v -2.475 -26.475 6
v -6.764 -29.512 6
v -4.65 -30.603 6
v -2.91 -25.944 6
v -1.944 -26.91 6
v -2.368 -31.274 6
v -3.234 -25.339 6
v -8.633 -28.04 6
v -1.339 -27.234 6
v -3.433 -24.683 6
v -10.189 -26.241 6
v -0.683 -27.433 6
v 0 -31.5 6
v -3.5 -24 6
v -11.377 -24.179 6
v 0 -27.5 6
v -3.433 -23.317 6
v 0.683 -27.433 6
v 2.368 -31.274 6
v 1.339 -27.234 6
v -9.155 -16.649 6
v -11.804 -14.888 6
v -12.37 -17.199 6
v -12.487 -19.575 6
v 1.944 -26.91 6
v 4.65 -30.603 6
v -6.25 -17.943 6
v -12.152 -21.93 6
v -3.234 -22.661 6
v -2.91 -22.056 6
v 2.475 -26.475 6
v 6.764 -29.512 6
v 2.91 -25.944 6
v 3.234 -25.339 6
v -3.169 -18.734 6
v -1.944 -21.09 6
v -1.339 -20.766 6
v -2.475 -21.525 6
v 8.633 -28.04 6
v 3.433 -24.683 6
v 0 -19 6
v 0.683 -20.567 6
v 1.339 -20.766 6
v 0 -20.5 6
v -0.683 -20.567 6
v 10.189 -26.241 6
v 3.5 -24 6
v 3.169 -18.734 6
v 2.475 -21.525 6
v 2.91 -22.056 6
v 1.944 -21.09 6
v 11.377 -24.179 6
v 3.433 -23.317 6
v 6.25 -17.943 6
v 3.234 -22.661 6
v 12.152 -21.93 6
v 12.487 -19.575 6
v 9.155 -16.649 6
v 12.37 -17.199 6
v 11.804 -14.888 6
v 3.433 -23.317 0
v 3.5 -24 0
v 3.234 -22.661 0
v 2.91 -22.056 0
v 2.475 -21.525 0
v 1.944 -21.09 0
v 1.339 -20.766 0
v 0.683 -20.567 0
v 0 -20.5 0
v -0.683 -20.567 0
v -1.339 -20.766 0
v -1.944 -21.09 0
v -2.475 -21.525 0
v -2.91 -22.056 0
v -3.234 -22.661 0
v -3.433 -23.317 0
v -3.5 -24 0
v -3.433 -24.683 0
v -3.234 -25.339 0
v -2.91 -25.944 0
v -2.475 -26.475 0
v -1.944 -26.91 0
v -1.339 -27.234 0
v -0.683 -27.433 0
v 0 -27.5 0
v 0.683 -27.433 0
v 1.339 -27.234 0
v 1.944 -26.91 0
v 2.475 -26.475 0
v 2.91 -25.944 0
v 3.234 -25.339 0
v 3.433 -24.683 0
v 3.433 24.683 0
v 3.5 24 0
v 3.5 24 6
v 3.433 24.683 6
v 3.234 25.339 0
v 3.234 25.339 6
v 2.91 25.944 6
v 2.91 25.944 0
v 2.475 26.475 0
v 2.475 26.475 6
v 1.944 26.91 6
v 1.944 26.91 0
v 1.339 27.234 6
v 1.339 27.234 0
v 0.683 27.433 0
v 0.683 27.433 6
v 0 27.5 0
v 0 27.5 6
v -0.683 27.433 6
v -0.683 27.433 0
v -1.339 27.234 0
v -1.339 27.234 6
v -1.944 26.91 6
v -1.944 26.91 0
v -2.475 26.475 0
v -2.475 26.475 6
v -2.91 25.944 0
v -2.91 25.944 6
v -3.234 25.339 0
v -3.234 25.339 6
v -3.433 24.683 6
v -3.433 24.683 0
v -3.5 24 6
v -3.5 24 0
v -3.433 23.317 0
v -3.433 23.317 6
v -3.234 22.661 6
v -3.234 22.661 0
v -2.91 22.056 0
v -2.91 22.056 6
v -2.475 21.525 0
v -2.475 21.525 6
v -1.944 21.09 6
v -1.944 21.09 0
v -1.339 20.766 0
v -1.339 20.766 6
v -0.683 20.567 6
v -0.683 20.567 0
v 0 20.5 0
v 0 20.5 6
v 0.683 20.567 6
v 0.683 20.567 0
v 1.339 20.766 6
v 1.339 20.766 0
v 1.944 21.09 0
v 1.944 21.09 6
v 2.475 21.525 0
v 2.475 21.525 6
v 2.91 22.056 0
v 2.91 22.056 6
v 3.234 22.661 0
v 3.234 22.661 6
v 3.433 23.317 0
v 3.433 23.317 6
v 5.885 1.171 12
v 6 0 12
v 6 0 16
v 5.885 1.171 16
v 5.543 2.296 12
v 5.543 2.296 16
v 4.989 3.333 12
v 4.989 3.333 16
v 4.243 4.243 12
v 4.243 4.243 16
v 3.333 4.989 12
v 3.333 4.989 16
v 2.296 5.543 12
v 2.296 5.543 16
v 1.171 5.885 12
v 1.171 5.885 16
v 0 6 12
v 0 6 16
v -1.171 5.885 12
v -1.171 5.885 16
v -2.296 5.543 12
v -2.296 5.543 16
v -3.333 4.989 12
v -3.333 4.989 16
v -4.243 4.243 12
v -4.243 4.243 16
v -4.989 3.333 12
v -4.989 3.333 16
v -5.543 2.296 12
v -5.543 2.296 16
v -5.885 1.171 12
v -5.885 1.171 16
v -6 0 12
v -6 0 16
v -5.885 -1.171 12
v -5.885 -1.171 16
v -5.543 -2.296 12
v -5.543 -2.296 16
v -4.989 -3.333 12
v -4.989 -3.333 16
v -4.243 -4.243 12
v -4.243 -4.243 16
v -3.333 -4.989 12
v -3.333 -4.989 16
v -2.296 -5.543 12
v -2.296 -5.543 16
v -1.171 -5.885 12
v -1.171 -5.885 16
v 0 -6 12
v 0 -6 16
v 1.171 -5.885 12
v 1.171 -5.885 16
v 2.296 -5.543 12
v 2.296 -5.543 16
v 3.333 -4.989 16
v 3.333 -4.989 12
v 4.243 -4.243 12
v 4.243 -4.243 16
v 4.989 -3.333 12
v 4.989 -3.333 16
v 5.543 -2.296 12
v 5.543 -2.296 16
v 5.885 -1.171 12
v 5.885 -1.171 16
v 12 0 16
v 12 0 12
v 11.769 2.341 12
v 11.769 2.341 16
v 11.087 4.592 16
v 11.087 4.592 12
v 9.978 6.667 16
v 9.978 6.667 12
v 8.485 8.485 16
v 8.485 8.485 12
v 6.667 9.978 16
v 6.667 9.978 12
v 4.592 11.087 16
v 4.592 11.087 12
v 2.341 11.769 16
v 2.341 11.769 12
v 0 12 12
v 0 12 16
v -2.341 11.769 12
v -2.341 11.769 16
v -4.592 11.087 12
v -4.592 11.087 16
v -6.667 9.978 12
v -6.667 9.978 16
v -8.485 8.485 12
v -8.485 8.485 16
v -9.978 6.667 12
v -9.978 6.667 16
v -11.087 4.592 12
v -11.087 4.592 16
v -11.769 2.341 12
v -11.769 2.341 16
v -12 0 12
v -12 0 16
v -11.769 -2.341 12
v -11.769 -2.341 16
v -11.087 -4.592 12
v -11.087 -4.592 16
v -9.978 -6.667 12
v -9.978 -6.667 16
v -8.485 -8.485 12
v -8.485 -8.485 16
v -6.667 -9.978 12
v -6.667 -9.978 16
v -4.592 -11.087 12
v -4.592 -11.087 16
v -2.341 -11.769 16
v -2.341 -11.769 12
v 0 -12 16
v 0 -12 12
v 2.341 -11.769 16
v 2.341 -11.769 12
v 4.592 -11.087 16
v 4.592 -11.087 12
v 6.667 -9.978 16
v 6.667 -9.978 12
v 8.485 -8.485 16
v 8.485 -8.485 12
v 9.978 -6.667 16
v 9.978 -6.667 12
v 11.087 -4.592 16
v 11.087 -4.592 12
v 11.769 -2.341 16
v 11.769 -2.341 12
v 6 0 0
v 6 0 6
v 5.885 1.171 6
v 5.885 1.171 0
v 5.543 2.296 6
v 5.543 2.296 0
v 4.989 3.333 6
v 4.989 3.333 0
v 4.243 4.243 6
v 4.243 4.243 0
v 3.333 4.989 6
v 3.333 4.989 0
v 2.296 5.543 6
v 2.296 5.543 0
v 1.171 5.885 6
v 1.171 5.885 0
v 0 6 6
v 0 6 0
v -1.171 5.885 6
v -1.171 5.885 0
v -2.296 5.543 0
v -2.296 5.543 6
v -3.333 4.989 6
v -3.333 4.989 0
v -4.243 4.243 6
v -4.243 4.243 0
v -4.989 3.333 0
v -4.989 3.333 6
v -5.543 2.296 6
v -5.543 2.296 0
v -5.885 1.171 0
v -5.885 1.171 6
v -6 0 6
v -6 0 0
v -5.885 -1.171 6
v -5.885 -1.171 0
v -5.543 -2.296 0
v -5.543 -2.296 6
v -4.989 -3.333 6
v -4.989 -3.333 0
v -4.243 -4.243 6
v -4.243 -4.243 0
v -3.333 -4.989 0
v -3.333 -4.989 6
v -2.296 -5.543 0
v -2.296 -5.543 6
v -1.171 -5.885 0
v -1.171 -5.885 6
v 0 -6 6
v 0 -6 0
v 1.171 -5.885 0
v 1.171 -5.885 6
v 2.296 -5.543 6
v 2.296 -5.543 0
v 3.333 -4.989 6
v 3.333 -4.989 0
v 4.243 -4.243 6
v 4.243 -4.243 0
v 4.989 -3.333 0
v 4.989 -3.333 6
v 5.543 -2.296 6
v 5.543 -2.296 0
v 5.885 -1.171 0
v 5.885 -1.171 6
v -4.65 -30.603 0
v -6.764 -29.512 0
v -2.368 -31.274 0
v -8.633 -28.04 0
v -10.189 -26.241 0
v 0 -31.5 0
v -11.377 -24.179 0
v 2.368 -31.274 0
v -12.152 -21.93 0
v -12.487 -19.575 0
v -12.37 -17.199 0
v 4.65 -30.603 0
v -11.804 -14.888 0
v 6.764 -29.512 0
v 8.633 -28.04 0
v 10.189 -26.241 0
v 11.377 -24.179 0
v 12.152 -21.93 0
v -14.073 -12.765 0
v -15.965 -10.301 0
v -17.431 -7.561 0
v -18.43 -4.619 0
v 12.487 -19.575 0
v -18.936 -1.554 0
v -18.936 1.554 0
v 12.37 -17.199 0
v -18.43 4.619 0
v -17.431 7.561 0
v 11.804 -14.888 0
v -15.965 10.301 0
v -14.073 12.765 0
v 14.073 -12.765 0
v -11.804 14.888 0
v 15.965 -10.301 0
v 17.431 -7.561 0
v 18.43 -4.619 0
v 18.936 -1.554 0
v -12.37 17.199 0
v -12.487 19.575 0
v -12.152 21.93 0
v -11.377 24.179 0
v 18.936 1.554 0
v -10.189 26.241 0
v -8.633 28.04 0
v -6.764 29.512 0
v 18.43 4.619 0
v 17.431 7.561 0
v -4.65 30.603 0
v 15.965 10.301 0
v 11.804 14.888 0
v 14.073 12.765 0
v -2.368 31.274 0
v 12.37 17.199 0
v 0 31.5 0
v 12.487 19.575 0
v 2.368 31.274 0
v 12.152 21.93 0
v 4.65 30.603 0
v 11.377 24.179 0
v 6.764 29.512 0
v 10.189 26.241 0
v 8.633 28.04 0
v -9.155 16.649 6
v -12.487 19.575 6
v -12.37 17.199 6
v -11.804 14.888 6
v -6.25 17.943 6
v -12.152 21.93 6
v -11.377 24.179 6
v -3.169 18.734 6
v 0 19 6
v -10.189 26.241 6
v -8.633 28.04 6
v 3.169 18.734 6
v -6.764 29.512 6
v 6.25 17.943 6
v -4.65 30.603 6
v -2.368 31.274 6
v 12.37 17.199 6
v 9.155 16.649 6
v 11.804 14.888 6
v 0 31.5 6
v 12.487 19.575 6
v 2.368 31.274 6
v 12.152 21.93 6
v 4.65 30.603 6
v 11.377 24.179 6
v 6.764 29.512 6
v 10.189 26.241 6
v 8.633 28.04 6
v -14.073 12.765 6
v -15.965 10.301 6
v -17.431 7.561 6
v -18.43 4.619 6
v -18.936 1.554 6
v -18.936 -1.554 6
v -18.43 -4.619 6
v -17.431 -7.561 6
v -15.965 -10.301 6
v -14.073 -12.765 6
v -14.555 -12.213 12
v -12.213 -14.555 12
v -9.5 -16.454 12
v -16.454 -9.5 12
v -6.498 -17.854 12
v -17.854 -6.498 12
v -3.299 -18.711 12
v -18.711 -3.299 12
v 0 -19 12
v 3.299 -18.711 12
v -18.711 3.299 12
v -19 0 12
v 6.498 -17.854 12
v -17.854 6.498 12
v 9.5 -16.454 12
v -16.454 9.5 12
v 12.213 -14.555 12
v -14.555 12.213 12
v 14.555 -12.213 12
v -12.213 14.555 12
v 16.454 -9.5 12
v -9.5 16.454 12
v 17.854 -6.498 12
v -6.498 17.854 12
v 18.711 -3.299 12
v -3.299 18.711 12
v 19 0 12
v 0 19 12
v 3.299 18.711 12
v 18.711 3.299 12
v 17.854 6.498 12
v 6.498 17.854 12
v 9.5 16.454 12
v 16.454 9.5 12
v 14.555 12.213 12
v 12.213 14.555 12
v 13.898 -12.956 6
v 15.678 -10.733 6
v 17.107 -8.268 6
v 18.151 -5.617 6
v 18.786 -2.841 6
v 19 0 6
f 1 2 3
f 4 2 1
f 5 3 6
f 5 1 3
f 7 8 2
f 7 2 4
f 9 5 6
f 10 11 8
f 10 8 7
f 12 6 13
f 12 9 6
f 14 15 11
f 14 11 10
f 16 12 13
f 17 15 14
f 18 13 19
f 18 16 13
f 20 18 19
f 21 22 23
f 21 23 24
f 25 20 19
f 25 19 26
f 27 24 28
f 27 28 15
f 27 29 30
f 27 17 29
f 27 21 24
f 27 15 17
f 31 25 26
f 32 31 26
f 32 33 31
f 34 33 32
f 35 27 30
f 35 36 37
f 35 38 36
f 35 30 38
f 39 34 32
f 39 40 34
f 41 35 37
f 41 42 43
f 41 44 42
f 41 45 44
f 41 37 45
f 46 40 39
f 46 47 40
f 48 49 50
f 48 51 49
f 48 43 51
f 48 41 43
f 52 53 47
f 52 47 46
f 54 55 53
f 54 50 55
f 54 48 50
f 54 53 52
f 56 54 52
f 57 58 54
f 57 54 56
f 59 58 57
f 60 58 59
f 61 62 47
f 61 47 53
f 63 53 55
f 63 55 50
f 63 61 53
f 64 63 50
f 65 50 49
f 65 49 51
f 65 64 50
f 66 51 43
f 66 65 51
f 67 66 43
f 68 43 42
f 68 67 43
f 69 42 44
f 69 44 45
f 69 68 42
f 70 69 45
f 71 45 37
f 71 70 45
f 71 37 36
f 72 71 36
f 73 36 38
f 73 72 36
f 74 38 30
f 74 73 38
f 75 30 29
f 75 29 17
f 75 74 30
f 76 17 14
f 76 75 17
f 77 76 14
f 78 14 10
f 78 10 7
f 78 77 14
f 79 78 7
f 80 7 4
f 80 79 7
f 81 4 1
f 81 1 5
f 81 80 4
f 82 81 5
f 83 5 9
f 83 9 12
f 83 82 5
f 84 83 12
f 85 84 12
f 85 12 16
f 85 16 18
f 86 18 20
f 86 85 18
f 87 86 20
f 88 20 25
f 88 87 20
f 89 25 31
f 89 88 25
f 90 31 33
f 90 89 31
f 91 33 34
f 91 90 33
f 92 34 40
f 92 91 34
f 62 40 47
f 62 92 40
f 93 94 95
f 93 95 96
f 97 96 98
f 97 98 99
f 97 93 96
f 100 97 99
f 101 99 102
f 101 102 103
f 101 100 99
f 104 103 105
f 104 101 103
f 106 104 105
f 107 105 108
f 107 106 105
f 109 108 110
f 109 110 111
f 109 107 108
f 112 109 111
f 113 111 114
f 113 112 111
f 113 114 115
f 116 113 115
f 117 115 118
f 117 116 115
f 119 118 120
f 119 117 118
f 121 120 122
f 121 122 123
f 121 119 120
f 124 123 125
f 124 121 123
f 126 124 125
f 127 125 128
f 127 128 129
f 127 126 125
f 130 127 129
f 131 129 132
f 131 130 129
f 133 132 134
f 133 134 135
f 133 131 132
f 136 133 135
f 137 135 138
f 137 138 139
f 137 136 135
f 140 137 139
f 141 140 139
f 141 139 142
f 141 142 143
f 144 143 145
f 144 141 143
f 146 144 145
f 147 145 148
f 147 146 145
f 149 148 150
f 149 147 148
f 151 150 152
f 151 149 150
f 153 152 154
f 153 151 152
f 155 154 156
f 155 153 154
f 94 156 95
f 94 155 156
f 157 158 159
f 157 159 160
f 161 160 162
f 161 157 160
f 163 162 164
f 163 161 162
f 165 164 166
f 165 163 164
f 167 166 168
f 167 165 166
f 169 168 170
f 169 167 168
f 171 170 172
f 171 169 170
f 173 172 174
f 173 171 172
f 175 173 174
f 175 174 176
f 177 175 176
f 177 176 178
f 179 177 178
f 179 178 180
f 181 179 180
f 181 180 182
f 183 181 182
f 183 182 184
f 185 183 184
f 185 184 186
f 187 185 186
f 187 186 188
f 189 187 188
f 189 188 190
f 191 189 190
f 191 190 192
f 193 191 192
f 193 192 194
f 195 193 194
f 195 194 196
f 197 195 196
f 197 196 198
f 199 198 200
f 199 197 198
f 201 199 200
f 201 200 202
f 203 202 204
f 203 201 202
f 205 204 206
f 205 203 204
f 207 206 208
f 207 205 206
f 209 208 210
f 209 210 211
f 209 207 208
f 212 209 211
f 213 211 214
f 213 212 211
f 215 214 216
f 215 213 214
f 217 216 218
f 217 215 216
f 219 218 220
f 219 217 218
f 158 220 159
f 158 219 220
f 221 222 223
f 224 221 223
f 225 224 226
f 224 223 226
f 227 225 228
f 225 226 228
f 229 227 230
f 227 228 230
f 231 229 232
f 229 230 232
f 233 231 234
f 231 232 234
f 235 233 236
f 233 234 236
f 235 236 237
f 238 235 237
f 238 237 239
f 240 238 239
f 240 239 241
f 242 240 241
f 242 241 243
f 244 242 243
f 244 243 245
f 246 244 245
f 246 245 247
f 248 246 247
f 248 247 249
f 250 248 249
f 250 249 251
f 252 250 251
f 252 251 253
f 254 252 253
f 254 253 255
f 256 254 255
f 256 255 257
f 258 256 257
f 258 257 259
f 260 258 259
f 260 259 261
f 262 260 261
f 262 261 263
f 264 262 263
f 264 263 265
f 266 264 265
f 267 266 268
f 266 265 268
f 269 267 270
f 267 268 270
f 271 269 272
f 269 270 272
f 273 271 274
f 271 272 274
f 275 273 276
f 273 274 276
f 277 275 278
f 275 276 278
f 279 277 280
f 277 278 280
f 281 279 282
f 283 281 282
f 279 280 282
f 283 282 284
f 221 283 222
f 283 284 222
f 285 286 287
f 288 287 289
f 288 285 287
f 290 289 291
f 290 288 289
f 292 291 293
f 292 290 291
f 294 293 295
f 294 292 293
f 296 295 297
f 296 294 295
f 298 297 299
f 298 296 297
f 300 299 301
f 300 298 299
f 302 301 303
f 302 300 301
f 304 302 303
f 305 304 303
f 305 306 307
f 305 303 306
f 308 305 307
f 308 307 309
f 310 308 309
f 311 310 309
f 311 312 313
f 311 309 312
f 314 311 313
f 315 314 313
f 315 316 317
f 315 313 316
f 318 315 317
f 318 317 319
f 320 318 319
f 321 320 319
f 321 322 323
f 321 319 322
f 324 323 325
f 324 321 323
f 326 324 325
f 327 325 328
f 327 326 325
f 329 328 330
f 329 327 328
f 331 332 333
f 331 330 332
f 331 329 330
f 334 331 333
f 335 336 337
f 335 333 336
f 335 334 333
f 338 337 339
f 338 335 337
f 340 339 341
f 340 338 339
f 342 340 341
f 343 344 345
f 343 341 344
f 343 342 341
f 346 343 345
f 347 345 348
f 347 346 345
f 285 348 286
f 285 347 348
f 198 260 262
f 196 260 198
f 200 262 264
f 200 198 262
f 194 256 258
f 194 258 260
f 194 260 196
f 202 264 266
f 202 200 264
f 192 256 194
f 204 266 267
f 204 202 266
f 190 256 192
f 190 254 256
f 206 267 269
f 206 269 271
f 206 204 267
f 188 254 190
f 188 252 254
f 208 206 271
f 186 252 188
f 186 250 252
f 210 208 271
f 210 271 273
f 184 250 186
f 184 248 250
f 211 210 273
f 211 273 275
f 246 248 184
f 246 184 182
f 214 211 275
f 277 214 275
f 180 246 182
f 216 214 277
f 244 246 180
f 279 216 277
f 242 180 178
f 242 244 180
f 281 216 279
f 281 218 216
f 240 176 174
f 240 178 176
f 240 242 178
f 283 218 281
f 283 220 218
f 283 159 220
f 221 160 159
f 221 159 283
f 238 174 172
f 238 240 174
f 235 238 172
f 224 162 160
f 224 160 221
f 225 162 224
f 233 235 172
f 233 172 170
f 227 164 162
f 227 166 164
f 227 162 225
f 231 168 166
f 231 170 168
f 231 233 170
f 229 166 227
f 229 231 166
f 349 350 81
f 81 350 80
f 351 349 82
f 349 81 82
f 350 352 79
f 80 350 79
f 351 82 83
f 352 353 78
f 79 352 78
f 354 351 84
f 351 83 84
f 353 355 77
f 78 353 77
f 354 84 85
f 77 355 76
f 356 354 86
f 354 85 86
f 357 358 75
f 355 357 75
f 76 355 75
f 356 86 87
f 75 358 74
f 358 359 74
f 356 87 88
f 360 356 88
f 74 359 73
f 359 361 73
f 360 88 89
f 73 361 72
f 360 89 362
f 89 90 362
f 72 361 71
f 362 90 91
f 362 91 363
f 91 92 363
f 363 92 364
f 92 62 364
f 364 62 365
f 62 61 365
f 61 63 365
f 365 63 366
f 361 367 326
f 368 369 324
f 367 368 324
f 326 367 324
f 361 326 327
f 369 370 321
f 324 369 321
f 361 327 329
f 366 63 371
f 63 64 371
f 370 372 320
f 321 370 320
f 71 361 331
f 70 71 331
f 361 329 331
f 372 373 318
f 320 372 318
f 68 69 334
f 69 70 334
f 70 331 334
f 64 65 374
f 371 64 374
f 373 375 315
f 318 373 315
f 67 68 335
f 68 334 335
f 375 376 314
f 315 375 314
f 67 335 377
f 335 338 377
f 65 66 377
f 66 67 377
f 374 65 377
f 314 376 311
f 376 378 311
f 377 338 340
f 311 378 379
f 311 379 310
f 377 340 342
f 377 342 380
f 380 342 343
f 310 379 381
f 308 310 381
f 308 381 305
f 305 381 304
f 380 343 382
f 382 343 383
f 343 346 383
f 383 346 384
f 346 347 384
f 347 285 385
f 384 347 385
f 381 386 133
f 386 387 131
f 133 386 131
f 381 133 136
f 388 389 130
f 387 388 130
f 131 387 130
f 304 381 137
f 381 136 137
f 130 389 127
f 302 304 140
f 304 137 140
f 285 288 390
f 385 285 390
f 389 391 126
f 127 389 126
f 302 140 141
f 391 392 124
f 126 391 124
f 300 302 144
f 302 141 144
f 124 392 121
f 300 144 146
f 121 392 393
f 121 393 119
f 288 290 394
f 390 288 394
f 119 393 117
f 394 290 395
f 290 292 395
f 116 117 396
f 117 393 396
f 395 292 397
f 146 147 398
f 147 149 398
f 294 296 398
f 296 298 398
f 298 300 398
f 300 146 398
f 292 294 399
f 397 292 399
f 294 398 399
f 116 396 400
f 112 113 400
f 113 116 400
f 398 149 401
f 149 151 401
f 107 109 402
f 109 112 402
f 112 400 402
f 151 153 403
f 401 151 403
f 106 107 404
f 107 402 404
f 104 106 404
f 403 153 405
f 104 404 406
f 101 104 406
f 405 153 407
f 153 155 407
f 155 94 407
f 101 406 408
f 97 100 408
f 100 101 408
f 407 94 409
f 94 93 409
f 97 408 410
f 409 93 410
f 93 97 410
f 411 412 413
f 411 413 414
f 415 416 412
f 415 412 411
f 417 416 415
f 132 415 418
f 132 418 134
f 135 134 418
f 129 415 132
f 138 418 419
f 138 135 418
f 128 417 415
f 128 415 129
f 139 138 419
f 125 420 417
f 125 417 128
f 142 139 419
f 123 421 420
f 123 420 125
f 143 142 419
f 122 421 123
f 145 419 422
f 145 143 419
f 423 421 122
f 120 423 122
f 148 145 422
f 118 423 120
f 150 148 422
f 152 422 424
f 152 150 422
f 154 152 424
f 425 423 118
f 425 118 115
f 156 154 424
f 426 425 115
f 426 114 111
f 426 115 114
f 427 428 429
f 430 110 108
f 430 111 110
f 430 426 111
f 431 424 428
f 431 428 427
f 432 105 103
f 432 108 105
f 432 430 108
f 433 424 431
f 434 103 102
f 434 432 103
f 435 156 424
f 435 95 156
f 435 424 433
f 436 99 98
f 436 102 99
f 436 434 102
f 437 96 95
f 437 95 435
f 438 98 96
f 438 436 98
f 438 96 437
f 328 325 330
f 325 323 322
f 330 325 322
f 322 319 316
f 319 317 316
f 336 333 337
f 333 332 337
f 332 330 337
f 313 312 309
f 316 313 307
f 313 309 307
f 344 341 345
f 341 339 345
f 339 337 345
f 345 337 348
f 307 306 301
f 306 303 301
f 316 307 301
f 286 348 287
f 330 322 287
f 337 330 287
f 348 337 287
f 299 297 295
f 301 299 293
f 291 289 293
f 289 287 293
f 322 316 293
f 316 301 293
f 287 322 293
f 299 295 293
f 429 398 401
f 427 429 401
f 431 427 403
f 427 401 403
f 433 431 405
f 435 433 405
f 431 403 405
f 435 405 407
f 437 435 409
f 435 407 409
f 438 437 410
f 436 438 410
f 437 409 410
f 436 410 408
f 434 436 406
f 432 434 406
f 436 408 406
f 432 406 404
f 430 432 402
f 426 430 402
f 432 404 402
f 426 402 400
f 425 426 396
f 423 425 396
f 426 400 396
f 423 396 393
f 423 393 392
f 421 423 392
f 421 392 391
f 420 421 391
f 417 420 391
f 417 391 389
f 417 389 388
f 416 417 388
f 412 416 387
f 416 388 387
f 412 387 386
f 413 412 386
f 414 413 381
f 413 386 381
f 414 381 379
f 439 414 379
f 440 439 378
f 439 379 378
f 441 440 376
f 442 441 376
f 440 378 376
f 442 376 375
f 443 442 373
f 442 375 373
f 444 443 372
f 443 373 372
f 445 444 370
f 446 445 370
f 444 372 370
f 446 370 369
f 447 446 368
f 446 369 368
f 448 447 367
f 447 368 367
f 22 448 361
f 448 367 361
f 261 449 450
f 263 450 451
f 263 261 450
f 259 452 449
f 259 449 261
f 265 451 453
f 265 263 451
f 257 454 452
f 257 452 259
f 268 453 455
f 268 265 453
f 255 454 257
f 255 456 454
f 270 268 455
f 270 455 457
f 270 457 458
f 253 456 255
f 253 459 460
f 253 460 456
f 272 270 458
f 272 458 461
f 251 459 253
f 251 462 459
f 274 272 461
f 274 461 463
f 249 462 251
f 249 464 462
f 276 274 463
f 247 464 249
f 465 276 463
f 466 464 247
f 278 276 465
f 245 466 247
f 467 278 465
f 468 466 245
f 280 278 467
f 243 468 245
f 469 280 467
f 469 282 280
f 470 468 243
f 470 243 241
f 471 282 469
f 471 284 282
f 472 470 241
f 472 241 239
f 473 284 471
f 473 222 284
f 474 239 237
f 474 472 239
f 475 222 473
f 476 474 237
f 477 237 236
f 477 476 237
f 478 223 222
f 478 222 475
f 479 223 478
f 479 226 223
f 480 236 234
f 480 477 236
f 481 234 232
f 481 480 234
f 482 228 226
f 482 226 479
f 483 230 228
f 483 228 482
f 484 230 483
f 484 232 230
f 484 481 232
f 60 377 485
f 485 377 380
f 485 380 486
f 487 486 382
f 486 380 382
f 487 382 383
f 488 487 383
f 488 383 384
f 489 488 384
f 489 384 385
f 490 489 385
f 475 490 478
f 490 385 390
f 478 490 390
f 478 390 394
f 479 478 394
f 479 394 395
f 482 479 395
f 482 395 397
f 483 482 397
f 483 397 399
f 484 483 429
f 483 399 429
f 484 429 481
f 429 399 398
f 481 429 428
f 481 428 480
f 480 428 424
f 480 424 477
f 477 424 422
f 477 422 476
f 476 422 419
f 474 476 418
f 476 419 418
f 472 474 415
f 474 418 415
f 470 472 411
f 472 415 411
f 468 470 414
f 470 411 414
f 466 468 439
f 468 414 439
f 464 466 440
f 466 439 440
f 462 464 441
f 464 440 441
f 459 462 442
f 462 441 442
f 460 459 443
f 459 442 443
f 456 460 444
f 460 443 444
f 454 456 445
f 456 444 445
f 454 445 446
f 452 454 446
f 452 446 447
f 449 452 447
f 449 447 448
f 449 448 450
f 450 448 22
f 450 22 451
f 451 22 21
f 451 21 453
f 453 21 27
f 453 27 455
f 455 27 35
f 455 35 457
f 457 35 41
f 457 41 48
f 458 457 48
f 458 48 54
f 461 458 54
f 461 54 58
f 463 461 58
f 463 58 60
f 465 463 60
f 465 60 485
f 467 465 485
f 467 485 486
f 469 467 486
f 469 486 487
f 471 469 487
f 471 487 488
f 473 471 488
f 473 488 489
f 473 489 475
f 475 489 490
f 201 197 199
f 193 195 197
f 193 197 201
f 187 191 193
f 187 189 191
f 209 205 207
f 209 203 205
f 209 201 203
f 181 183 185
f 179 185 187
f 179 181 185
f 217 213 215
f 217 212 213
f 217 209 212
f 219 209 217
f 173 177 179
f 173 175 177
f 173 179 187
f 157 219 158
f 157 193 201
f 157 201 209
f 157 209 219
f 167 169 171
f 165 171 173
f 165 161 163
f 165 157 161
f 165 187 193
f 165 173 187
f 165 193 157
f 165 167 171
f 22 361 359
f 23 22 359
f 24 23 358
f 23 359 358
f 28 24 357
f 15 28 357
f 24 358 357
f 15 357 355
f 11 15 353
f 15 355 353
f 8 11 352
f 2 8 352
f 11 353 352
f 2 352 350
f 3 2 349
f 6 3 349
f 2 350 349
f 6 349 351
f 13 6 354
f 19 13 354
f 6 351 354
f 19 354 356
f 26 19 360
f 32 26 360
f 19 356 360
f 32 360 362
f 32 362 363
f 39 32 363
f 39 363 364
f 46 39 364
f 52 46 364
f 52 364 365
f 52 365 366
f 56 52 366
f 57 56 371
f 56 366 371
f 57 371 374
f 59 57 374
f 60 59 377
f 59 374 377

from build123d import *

# Parameters (mm, degrees)
SKETCH1_R      = 12
SKETCH1_R_2    = 3.5
EXTRUDE1_DEPTH = 6
SKETCH1_3_R    = 12
SKETCH1_3_R_2  = 6
EXTRUDE2_DEPTH = 16
SKETCH2_R      = 19
EXTRUDE3_DEPTH = 6


with BuildPart() as part:
    # Sketch1 → Extrude1 (new body)
    with BuildSketch(Plane.XY):
        with BuildLine():
            ThreePointArc((11.804353201, 14.888157895), (0, 31.5), (-11.804353201, 14.888157895))
            ThreePointArc((-11.804353201, 14.888157895), (-19, 0), (-11.804353201, -14.888157895))
            ThreePointArc((-11.804353201, -14.888157895), (0, -31.5), (11.804353201, -14.888157895))
            ThreePointArc((11.804353201, -14.888157895), (19, 0), (11.804353201, 14.888157895))
        make_face()
        Circle(SKETCH1_R, mode=Mode.SUBTRACT)
        with Locations((0, 24)):
            Circle(SKETCH1_R_2, mode=Mode.SUBTRACT)
        with Locations((0, -24)):
            Circle(SKETCH1_R_2, mode=Mode.SUBTRACT)
    extrude(amount=EXTRUDE1_DEPTH)

    # Sketch1<3> → Extrude2 (add)
    with BuildSketch(Plane.XY):
        Circle(SKETCH1_3_R)
        Circle(SKETCH1_3_R_2, mode=Mode.SUBTRACT)
    extrude(amount=EXTRUDE2_DEPTH)

    # Sketch2 → Extrude3 (add)
    with BuildSketch(Plane.XY.offset(6)):
        Circle(SKETCH2_R)
    extrude(amount=EXTRUDE3_DEPTH)


solid = part.part
